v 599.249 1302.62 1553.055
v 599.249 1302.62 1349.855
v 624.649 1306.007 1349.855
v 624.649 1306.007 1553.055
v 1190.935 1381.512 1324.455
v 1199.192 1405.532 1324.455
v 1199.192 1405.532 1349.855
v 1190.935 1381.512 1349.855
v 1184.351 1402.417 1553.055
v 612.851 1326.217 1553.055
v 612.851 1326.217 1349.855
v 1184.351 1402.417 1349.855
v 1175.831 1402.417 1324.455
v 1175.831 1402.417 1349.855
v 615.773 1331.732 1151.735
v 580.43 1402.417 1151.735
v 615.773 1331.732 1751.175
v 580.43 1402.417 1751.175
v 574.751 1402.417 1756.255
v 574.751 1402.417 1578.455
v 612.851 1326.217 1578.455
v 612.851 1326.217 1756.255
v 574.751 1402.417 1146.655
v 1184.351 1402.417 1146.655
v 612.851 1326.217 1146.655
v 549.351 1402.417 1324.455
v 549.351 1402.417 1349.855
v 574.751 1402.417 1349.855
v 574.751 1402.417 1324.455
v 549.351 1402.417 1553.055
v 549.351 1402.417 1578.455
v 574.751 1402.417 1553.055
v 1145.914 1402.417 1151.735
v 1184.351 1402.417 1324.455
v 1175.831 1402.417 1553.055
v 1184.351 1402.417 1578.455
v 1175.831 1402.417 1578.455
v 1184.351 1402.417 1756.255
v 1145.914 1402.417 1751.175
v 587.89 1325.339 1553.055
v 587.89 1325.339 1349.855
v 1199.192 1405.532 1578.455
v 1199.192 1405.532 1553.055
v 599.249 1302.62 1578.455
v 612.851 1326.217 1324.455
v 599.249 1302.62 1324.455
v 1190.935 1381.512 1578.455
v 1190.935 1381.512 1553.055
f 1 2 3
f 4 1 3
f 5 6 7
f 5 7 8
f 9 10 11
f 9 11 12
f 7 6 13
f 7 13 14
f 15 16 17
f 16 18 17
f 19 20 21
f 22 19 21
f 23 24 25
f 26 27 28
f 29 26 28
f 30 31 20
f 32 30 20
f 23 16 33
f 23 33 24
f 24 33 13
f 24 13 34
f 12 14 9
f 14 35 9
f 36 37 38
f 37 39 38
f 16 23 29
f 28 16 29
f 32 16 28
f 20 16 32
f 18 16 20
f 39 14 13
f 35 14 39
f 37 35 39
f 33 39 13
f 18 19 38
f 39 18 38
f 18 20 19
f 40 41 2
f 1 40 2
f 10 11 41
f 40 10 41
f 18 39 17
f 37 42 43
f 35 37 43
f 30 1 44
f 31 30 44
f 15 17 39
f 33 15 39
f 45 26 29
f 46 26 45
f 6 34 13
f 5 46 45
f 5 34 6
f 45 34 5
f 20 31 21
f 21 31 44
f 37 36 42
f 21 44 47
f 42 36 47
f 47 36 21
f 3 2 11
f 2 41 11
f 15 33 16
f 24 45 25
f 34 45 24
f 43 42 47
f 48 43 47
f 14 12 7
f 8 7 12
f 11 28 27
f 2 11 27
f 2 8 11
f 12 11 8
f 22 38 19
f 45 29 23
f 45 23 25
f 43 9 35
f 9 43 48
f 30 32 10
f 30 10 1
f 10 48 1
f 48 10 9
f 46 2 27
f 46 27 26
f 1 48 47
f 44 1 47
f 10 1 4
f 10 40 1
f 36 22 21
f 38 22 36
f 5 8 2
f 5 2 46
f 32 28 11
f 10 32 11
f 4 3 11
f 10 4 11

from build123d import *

# Parameters (mm, degrees)
BOSS_EXTRUDE1_DEPTH = 609.6
SHELL1_T            = -5.08
SKETCH1_W           = 25.4
SKETCH1_H           = 25.4
BOSS_EXTRUDE5_DEPTH = 203.2


with BuildPart() as part:
    # 3DSketch1 → Boss-Extrude1 (new body)
    with BuildSketch(Plane(origin=(574.750801769, 1402.417106037, 1756.25455637), x_dir=(1, 0, 0), z_dir=(0, 0, -1))):
        Polygon((0, 0), (38.1, 76.2), (609.6, 0), align=None)
    extrude(amount=BOSS_EXTRUDE1_DEPTH)

    # Shell1
    shell1_openings = [part.faces().sort_by_distance(p)[0] for p in [
        (879.550801769, 1402.417106037, 1451.45455637),
    ]]
    offset(amount=SHELL1_T, openings=shell1_openings, kind=Kind.INTERSECTION)

    # Sweep1: sweep along a path in Sketch3
    with BuildLine(Plane.XY.offset(1565.75455637)) as sweep1_path:
        Line((562.050801769, 1402.417106037), (605.783819273, 1314.951071029))
        Line((605.783819273, 1314.951071029), (1195.063819273, 1393.521737696))
    # Sketch1 → Sweep1 (sweep)
    with BuildSketch(Plane(origin=(0, 1402.417106037, 0), x_dir=(1, 0, 0), z_dir=(0, 1, 0))):
        with Locations((562.050801769, -1565.75455637)):
            Rectangle(SKETCH1_W, SKETCH1_H)
    sweep1 = sweep(path=sweep1_path.line, transition=Transition.RIGHT)

    # Mirror1: Sweep1 across plane
    add(sweep1.mirror(Plane.XY.offset(1451.45455637)))


with BuildPart() as body_2:
    # Sketch4 → Boss-Extrude5 (new body)
    with BuildSketch(Plane(origin=(0, 0, 1553.05455637), x_dir=(-1, 0, 0), z_dir=(0, 0, -1))):
        Polygon((-599.249327743, 1302.620054088), (-624.649327743, 1306.006720755), (-612.850801769, 1326.217106037), (-587.890102418, 1325.33850474), align=None)
    extrude(amount=BOSS_EXTRUDE5_DEPTH)


solid = Compound([part.part, body_2.part])
